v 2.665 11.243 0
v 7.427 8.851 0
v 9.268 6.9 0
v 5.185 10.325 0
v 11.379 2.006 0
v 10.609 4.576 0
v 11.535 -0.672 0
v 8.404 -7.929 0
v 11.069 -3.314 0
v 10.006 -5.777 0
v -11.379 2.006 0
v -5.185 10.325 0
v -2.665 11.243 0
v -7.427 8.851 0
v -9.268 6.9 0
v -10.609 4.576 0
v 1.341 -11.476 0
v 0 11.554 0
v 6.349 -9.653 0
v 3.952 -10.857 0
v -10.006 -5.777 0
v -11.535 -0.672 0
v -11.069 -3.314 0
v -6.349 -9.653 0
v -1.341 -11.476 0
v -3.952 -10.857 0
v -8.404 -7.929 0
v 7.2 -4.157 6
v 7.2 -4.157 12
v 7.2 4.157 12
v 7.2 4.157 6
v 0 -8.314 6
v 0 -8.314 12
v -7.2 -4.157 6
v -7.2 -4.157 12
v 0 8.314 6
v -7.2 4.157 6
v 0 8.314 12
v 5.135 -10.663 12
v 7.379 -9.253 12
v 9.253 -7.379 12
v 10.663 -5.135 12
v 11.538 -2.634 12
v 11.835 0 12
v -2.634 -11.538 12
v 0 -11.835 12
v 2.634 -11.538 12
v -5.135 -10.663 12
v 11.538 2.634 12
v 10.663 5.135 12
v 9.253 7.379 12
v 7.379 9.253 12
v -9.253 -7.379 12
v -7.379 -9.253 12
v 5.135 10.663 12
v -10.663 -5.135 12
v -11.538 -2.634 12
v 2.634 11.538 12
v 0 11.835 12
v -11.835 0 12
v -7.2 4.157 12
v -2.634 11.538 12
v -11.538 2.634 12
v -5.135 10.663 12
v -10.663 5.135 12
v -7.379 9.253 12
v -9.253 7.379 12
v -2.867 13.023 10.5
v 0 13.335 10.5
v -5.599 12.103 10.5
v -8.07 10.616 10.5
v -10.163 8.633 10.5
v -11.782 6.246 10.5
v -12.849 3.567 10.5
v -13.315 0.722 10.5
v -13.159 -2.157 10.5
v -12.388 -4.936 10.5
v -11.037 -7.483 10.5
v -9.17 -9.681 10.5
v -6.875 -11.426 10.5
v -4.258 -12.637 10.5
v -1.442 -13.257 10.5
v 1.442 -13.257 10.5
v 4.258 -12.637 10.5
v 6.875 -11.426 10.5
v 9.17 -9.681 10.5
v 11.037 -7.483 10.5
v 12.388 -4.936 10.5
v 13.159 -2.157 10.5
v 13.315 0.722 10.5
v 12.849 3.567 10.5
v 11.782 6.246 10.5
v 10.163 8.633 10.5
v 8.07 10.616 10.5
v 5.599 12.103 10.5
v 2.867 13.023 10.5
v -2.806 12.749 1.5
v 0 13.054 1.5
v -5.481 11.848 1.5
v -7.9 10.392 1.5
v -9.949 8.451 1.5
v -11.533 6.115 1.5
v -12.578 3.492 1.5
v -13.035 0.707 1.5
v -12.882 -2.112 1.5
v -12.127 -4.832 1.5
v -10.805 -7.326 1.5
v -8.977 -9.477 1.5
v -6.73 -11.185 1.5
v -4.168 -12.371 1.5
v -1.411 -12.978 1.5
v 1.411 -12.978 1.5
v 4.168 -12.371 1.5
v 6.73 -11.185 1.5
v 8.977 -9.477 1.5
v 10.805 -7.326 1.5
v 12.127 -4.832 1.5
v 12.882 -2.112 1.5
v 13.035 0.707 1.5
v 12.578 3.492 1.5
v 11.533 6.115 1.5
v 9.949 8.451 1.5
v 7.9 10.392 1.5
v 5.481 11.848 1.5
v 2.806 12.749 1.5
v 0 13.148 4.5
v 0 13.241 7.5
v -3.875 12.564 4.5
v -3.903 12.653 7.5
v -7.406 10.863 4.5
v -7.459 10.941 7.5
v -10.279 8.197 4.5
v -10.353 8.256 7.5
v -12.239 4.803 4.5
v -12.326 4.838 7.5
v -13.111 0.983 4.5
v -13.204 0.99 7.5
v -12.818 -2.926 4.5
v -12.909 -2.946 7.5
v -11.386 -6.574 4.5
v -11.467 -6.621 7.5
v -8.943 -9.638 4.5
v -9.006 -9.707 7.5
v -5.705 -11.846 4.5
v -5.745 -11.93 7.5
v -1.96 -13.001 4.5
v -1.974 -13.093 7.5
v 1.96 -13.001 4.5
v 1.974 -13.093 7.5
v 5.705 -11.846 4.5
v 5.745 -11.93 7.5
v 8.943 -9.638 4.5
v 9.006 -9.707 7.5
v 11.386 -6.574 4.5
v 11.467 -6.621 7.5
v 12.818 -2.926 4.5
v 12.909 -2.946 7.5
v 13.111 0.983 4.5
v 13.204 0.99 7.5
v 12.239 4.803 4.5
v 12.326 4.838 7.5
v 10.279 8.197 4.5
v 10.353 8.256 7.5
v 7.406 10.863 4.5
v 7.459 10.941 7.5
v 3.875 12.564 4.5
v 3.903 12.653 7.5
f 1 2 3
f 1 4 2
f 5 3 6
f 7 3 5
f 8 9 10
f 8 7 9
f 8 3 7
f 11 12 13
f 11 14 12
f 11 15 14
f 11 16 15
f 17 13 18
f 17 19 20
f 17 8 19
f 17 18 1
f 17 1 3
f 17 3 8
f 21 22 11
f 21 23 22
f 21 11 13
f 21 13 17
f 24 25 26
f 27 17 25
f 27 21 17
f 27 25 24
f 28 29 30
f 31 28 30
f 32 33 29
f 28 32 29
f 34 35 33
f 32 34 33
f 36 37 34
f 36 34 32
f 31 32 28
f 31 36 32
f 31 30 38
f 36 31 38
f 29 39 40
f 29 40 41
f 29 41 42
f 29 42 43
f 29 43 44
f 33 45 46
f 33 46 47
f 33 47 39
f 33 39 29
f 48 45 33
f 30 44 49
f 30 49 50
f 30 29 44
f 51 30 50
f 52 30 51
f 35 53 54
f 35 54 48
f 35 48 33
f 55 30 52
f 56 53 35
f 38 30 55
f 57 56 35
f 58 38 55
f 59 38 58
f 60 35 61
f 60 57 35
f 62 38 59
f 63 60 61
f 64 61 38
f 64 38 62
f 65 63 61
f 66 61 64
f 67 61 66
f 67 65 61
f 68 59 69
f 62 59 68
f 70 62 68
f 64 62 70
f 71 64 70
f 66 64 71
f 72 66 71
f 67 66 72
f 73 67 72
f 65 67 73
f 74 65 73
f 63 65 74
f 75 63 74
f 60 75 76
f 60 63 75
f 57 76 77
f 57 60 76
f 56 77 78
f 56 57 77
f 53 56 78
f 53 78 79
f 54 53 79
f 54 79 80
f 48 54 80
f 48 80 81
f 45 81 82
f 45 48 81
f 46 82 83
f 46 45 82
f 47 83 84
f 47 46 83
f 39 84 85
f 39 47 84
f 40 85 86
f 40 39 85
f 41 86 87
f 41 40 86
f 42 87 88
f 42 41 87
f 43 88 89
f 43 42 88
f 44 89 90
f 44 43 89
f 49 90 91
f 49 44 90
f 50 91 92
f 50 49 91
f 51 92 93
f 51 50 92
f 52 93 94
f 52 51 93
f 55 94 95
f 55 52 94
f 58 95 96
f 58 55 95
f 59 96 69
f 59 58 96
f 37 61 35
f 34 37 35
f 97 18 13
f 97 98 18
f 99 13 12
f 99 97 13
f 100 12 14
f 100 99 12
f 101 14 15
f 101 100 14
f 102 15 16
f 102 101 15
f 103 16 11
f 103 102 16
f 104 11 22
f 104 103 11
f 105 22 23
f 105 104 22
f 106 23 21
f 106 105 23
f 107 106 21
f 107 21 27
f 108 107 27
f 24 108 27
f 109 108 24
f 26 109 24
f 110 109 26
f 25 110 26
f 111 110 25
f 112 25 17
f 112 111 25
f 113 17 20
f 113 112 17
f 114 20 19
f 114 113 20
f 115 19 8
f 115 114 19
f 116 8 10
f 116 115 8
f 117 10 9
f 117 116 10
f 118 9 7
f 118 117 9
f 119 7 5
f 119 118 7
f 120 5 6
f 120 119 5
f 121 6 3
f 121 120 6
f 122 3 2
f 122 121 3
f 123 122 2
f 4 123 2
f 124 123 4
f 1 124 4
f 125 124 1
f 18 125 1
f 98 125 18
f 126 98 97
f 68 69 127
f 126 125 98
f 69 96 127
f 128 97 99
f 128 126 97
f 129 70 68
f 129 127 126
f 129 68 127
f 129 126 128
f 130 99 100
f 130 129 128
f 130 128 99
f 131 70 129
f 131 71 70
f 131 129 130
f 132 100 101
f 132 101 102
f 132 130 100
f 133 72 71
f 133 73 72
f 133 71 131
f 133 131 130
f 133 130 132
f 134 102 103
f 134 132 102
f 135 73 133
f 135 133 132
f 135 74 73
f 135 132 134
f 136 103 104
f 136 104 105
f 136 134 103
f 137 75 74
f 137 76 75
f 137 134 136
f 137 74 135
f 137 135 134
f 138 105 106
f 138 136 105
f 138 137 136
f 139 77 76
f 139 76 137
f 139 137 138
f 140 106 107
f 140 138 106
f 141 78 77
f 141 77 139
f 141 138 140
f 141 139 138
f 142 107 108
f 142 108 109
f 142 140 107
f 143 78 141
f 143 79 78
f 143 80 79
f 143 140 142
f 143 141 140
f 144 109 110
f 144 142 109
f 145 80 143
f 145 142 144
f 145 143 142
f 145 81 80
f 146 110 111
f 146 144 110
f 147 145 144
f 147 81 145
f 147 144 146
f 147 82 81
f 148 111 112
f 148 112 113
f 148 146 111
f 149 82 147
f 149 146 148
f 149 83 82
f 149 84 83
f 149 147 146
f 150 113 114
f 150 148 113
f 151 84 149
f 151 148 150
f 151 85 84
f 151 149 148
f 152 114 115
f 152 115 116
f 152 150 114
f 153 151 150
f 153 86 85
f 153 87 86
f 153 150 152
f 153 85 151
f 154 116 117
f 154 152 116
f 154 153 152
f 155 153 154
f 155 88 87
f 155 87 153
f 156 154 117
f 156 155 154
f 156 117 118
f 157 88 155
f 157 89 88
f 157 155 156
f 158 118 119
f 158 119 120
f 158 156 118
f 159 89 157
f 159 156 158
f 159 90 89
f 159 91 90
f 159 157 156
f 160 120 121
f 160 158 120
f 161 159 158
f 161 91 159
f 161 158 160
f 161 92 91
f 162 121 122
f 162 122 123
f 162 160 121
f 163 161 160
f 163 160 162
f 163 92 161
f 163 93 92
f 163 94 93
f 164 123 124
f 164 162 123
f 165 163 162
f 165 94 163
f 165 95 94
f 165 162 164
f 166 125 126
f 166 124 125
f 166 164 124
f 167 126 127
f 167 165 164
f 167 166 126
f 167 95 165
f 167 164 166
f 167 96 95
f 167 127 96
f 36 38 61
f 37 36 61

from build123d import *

# Parameters (mm, degrees)
CUT_EXTRUDE1_DEPTH = 6


with BuildPart() as part:
    # Sketch1 → Revolve1 (revolve)
    with BuildSketch(Plane(origin=(0, 0, 0), x_dir=(0, 0, -1), z_dir=(1, 0, 0))):
        Polygon((0, 0), (0, 11.55405041), (-1.5, 13.05405041), (-10.5, 13.335), (-12, 11.835), (-12, 0), align=None)
    revolve(axis=Axis((0, 0, 0), (0, 0, 1)))

    # Sketch2 → Cut-Extrude1 (cut)
    with BuildSketch(Plane.XY.offset(12)):
        Polygon((0, -8.313843876), (7.2, -4.156921938), (7.2, 4.156921938), (0, 8.313843876), (-7.2, 4.156921938), (-7.2, -4.156921938), align=None)
    extrude(amount=-CUT_EXTRUDE1_DEPTH, mode=Mode.SUBTRACT)


solid = part.part
